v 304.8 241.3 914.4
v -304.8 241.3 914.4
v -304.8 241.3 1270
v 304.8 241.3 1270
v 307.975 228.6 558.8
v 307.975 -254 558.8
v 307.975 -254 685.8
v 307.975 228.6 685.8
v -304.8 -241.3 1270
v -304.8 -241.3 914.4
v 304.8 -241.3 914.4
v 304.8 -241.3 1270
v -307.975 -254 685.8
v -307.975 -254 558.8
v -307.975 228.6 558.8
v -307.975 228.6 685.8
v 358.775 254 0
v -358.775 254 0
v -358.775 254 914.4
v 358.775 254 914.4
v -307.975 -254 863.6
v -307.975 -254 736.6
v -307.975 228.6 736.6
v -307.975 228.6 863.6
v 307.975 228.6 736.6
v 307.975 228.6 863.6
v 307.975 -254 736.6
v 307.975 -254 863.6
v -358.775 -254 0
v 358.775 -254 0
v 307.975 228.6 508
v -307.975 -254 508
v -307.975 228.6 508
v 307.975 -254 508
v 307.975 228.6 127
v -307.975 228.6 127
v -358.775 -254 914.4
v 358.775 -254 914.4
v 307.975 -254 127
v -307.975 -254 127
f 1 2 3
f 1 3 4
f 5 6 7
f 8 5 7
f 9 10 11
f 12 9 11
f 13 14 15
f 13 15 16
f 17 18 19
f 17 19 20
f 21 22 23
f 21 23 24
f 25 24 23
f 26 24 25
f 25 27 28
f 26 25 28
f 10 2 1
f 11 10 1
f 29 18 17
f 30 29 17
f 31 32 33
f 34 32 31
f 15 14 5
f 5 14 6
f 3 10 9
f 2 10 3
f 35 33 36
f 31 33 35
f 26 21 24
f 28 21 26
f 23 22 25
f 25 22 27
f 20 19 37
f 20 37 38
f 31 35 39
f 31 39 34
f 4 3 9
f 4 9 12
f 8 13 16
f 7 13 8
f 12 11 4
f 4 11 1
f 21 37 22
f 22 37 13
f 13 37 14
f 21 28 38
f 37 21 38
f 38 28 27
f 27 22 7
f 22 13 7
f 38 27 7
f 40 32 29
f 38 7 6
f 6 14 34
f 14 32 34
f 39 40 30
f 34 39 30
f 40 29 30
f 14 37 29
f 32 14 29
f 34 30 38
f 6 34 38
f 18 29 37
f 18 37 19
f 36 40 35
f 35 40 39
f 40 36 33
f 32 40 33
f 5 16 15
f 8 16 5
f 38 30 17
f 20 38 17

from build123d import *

# Parameters (mm, degrees)
F0_W     = 717.55
F0_H     = 508
F1_DEPTH = 914.4
F2_W     = 609.6
F2_H     = 482.6
F3_DEPTH = 355.6
F4_W     = 615.95
F4_H     = 127
F4_H_2   = 381
F5_DEPTH = 482.6


with BuildPart() as f1:
    # F0 (on Top) → F1 (new body)
    with BuildSketch(Plane.XY):
        Rectangle(F0_W, F0_H)
    extrude(amount=F1_DEPTH)

    # F4 (on face) → F5 (cut)
    with BuildSketch(Plane.XZ.offset(254)):
        with Locations((0, 800.1)):
            Rectangle(F4_W, F4_H)
        with Locations((0, 317.5)):
            Rectangle(F4_W, F4_H_2)
        with Locations((0, 622.3)):
            Rectangle(F4_W, F4_H)
    extrude(amount=-F5_DEPTH, mode=Mode.SUBTRACT)


with BuildPart() as f3:
    # F2 (on face) → F3 (new body)
    with BuildSketch(Plane.XY.offset(914.4)):
        Rectangle(F2_W, F2_H)
    extrude(amount=F3_DEPTH)


solid = Compound([f1.part, f3.part])
